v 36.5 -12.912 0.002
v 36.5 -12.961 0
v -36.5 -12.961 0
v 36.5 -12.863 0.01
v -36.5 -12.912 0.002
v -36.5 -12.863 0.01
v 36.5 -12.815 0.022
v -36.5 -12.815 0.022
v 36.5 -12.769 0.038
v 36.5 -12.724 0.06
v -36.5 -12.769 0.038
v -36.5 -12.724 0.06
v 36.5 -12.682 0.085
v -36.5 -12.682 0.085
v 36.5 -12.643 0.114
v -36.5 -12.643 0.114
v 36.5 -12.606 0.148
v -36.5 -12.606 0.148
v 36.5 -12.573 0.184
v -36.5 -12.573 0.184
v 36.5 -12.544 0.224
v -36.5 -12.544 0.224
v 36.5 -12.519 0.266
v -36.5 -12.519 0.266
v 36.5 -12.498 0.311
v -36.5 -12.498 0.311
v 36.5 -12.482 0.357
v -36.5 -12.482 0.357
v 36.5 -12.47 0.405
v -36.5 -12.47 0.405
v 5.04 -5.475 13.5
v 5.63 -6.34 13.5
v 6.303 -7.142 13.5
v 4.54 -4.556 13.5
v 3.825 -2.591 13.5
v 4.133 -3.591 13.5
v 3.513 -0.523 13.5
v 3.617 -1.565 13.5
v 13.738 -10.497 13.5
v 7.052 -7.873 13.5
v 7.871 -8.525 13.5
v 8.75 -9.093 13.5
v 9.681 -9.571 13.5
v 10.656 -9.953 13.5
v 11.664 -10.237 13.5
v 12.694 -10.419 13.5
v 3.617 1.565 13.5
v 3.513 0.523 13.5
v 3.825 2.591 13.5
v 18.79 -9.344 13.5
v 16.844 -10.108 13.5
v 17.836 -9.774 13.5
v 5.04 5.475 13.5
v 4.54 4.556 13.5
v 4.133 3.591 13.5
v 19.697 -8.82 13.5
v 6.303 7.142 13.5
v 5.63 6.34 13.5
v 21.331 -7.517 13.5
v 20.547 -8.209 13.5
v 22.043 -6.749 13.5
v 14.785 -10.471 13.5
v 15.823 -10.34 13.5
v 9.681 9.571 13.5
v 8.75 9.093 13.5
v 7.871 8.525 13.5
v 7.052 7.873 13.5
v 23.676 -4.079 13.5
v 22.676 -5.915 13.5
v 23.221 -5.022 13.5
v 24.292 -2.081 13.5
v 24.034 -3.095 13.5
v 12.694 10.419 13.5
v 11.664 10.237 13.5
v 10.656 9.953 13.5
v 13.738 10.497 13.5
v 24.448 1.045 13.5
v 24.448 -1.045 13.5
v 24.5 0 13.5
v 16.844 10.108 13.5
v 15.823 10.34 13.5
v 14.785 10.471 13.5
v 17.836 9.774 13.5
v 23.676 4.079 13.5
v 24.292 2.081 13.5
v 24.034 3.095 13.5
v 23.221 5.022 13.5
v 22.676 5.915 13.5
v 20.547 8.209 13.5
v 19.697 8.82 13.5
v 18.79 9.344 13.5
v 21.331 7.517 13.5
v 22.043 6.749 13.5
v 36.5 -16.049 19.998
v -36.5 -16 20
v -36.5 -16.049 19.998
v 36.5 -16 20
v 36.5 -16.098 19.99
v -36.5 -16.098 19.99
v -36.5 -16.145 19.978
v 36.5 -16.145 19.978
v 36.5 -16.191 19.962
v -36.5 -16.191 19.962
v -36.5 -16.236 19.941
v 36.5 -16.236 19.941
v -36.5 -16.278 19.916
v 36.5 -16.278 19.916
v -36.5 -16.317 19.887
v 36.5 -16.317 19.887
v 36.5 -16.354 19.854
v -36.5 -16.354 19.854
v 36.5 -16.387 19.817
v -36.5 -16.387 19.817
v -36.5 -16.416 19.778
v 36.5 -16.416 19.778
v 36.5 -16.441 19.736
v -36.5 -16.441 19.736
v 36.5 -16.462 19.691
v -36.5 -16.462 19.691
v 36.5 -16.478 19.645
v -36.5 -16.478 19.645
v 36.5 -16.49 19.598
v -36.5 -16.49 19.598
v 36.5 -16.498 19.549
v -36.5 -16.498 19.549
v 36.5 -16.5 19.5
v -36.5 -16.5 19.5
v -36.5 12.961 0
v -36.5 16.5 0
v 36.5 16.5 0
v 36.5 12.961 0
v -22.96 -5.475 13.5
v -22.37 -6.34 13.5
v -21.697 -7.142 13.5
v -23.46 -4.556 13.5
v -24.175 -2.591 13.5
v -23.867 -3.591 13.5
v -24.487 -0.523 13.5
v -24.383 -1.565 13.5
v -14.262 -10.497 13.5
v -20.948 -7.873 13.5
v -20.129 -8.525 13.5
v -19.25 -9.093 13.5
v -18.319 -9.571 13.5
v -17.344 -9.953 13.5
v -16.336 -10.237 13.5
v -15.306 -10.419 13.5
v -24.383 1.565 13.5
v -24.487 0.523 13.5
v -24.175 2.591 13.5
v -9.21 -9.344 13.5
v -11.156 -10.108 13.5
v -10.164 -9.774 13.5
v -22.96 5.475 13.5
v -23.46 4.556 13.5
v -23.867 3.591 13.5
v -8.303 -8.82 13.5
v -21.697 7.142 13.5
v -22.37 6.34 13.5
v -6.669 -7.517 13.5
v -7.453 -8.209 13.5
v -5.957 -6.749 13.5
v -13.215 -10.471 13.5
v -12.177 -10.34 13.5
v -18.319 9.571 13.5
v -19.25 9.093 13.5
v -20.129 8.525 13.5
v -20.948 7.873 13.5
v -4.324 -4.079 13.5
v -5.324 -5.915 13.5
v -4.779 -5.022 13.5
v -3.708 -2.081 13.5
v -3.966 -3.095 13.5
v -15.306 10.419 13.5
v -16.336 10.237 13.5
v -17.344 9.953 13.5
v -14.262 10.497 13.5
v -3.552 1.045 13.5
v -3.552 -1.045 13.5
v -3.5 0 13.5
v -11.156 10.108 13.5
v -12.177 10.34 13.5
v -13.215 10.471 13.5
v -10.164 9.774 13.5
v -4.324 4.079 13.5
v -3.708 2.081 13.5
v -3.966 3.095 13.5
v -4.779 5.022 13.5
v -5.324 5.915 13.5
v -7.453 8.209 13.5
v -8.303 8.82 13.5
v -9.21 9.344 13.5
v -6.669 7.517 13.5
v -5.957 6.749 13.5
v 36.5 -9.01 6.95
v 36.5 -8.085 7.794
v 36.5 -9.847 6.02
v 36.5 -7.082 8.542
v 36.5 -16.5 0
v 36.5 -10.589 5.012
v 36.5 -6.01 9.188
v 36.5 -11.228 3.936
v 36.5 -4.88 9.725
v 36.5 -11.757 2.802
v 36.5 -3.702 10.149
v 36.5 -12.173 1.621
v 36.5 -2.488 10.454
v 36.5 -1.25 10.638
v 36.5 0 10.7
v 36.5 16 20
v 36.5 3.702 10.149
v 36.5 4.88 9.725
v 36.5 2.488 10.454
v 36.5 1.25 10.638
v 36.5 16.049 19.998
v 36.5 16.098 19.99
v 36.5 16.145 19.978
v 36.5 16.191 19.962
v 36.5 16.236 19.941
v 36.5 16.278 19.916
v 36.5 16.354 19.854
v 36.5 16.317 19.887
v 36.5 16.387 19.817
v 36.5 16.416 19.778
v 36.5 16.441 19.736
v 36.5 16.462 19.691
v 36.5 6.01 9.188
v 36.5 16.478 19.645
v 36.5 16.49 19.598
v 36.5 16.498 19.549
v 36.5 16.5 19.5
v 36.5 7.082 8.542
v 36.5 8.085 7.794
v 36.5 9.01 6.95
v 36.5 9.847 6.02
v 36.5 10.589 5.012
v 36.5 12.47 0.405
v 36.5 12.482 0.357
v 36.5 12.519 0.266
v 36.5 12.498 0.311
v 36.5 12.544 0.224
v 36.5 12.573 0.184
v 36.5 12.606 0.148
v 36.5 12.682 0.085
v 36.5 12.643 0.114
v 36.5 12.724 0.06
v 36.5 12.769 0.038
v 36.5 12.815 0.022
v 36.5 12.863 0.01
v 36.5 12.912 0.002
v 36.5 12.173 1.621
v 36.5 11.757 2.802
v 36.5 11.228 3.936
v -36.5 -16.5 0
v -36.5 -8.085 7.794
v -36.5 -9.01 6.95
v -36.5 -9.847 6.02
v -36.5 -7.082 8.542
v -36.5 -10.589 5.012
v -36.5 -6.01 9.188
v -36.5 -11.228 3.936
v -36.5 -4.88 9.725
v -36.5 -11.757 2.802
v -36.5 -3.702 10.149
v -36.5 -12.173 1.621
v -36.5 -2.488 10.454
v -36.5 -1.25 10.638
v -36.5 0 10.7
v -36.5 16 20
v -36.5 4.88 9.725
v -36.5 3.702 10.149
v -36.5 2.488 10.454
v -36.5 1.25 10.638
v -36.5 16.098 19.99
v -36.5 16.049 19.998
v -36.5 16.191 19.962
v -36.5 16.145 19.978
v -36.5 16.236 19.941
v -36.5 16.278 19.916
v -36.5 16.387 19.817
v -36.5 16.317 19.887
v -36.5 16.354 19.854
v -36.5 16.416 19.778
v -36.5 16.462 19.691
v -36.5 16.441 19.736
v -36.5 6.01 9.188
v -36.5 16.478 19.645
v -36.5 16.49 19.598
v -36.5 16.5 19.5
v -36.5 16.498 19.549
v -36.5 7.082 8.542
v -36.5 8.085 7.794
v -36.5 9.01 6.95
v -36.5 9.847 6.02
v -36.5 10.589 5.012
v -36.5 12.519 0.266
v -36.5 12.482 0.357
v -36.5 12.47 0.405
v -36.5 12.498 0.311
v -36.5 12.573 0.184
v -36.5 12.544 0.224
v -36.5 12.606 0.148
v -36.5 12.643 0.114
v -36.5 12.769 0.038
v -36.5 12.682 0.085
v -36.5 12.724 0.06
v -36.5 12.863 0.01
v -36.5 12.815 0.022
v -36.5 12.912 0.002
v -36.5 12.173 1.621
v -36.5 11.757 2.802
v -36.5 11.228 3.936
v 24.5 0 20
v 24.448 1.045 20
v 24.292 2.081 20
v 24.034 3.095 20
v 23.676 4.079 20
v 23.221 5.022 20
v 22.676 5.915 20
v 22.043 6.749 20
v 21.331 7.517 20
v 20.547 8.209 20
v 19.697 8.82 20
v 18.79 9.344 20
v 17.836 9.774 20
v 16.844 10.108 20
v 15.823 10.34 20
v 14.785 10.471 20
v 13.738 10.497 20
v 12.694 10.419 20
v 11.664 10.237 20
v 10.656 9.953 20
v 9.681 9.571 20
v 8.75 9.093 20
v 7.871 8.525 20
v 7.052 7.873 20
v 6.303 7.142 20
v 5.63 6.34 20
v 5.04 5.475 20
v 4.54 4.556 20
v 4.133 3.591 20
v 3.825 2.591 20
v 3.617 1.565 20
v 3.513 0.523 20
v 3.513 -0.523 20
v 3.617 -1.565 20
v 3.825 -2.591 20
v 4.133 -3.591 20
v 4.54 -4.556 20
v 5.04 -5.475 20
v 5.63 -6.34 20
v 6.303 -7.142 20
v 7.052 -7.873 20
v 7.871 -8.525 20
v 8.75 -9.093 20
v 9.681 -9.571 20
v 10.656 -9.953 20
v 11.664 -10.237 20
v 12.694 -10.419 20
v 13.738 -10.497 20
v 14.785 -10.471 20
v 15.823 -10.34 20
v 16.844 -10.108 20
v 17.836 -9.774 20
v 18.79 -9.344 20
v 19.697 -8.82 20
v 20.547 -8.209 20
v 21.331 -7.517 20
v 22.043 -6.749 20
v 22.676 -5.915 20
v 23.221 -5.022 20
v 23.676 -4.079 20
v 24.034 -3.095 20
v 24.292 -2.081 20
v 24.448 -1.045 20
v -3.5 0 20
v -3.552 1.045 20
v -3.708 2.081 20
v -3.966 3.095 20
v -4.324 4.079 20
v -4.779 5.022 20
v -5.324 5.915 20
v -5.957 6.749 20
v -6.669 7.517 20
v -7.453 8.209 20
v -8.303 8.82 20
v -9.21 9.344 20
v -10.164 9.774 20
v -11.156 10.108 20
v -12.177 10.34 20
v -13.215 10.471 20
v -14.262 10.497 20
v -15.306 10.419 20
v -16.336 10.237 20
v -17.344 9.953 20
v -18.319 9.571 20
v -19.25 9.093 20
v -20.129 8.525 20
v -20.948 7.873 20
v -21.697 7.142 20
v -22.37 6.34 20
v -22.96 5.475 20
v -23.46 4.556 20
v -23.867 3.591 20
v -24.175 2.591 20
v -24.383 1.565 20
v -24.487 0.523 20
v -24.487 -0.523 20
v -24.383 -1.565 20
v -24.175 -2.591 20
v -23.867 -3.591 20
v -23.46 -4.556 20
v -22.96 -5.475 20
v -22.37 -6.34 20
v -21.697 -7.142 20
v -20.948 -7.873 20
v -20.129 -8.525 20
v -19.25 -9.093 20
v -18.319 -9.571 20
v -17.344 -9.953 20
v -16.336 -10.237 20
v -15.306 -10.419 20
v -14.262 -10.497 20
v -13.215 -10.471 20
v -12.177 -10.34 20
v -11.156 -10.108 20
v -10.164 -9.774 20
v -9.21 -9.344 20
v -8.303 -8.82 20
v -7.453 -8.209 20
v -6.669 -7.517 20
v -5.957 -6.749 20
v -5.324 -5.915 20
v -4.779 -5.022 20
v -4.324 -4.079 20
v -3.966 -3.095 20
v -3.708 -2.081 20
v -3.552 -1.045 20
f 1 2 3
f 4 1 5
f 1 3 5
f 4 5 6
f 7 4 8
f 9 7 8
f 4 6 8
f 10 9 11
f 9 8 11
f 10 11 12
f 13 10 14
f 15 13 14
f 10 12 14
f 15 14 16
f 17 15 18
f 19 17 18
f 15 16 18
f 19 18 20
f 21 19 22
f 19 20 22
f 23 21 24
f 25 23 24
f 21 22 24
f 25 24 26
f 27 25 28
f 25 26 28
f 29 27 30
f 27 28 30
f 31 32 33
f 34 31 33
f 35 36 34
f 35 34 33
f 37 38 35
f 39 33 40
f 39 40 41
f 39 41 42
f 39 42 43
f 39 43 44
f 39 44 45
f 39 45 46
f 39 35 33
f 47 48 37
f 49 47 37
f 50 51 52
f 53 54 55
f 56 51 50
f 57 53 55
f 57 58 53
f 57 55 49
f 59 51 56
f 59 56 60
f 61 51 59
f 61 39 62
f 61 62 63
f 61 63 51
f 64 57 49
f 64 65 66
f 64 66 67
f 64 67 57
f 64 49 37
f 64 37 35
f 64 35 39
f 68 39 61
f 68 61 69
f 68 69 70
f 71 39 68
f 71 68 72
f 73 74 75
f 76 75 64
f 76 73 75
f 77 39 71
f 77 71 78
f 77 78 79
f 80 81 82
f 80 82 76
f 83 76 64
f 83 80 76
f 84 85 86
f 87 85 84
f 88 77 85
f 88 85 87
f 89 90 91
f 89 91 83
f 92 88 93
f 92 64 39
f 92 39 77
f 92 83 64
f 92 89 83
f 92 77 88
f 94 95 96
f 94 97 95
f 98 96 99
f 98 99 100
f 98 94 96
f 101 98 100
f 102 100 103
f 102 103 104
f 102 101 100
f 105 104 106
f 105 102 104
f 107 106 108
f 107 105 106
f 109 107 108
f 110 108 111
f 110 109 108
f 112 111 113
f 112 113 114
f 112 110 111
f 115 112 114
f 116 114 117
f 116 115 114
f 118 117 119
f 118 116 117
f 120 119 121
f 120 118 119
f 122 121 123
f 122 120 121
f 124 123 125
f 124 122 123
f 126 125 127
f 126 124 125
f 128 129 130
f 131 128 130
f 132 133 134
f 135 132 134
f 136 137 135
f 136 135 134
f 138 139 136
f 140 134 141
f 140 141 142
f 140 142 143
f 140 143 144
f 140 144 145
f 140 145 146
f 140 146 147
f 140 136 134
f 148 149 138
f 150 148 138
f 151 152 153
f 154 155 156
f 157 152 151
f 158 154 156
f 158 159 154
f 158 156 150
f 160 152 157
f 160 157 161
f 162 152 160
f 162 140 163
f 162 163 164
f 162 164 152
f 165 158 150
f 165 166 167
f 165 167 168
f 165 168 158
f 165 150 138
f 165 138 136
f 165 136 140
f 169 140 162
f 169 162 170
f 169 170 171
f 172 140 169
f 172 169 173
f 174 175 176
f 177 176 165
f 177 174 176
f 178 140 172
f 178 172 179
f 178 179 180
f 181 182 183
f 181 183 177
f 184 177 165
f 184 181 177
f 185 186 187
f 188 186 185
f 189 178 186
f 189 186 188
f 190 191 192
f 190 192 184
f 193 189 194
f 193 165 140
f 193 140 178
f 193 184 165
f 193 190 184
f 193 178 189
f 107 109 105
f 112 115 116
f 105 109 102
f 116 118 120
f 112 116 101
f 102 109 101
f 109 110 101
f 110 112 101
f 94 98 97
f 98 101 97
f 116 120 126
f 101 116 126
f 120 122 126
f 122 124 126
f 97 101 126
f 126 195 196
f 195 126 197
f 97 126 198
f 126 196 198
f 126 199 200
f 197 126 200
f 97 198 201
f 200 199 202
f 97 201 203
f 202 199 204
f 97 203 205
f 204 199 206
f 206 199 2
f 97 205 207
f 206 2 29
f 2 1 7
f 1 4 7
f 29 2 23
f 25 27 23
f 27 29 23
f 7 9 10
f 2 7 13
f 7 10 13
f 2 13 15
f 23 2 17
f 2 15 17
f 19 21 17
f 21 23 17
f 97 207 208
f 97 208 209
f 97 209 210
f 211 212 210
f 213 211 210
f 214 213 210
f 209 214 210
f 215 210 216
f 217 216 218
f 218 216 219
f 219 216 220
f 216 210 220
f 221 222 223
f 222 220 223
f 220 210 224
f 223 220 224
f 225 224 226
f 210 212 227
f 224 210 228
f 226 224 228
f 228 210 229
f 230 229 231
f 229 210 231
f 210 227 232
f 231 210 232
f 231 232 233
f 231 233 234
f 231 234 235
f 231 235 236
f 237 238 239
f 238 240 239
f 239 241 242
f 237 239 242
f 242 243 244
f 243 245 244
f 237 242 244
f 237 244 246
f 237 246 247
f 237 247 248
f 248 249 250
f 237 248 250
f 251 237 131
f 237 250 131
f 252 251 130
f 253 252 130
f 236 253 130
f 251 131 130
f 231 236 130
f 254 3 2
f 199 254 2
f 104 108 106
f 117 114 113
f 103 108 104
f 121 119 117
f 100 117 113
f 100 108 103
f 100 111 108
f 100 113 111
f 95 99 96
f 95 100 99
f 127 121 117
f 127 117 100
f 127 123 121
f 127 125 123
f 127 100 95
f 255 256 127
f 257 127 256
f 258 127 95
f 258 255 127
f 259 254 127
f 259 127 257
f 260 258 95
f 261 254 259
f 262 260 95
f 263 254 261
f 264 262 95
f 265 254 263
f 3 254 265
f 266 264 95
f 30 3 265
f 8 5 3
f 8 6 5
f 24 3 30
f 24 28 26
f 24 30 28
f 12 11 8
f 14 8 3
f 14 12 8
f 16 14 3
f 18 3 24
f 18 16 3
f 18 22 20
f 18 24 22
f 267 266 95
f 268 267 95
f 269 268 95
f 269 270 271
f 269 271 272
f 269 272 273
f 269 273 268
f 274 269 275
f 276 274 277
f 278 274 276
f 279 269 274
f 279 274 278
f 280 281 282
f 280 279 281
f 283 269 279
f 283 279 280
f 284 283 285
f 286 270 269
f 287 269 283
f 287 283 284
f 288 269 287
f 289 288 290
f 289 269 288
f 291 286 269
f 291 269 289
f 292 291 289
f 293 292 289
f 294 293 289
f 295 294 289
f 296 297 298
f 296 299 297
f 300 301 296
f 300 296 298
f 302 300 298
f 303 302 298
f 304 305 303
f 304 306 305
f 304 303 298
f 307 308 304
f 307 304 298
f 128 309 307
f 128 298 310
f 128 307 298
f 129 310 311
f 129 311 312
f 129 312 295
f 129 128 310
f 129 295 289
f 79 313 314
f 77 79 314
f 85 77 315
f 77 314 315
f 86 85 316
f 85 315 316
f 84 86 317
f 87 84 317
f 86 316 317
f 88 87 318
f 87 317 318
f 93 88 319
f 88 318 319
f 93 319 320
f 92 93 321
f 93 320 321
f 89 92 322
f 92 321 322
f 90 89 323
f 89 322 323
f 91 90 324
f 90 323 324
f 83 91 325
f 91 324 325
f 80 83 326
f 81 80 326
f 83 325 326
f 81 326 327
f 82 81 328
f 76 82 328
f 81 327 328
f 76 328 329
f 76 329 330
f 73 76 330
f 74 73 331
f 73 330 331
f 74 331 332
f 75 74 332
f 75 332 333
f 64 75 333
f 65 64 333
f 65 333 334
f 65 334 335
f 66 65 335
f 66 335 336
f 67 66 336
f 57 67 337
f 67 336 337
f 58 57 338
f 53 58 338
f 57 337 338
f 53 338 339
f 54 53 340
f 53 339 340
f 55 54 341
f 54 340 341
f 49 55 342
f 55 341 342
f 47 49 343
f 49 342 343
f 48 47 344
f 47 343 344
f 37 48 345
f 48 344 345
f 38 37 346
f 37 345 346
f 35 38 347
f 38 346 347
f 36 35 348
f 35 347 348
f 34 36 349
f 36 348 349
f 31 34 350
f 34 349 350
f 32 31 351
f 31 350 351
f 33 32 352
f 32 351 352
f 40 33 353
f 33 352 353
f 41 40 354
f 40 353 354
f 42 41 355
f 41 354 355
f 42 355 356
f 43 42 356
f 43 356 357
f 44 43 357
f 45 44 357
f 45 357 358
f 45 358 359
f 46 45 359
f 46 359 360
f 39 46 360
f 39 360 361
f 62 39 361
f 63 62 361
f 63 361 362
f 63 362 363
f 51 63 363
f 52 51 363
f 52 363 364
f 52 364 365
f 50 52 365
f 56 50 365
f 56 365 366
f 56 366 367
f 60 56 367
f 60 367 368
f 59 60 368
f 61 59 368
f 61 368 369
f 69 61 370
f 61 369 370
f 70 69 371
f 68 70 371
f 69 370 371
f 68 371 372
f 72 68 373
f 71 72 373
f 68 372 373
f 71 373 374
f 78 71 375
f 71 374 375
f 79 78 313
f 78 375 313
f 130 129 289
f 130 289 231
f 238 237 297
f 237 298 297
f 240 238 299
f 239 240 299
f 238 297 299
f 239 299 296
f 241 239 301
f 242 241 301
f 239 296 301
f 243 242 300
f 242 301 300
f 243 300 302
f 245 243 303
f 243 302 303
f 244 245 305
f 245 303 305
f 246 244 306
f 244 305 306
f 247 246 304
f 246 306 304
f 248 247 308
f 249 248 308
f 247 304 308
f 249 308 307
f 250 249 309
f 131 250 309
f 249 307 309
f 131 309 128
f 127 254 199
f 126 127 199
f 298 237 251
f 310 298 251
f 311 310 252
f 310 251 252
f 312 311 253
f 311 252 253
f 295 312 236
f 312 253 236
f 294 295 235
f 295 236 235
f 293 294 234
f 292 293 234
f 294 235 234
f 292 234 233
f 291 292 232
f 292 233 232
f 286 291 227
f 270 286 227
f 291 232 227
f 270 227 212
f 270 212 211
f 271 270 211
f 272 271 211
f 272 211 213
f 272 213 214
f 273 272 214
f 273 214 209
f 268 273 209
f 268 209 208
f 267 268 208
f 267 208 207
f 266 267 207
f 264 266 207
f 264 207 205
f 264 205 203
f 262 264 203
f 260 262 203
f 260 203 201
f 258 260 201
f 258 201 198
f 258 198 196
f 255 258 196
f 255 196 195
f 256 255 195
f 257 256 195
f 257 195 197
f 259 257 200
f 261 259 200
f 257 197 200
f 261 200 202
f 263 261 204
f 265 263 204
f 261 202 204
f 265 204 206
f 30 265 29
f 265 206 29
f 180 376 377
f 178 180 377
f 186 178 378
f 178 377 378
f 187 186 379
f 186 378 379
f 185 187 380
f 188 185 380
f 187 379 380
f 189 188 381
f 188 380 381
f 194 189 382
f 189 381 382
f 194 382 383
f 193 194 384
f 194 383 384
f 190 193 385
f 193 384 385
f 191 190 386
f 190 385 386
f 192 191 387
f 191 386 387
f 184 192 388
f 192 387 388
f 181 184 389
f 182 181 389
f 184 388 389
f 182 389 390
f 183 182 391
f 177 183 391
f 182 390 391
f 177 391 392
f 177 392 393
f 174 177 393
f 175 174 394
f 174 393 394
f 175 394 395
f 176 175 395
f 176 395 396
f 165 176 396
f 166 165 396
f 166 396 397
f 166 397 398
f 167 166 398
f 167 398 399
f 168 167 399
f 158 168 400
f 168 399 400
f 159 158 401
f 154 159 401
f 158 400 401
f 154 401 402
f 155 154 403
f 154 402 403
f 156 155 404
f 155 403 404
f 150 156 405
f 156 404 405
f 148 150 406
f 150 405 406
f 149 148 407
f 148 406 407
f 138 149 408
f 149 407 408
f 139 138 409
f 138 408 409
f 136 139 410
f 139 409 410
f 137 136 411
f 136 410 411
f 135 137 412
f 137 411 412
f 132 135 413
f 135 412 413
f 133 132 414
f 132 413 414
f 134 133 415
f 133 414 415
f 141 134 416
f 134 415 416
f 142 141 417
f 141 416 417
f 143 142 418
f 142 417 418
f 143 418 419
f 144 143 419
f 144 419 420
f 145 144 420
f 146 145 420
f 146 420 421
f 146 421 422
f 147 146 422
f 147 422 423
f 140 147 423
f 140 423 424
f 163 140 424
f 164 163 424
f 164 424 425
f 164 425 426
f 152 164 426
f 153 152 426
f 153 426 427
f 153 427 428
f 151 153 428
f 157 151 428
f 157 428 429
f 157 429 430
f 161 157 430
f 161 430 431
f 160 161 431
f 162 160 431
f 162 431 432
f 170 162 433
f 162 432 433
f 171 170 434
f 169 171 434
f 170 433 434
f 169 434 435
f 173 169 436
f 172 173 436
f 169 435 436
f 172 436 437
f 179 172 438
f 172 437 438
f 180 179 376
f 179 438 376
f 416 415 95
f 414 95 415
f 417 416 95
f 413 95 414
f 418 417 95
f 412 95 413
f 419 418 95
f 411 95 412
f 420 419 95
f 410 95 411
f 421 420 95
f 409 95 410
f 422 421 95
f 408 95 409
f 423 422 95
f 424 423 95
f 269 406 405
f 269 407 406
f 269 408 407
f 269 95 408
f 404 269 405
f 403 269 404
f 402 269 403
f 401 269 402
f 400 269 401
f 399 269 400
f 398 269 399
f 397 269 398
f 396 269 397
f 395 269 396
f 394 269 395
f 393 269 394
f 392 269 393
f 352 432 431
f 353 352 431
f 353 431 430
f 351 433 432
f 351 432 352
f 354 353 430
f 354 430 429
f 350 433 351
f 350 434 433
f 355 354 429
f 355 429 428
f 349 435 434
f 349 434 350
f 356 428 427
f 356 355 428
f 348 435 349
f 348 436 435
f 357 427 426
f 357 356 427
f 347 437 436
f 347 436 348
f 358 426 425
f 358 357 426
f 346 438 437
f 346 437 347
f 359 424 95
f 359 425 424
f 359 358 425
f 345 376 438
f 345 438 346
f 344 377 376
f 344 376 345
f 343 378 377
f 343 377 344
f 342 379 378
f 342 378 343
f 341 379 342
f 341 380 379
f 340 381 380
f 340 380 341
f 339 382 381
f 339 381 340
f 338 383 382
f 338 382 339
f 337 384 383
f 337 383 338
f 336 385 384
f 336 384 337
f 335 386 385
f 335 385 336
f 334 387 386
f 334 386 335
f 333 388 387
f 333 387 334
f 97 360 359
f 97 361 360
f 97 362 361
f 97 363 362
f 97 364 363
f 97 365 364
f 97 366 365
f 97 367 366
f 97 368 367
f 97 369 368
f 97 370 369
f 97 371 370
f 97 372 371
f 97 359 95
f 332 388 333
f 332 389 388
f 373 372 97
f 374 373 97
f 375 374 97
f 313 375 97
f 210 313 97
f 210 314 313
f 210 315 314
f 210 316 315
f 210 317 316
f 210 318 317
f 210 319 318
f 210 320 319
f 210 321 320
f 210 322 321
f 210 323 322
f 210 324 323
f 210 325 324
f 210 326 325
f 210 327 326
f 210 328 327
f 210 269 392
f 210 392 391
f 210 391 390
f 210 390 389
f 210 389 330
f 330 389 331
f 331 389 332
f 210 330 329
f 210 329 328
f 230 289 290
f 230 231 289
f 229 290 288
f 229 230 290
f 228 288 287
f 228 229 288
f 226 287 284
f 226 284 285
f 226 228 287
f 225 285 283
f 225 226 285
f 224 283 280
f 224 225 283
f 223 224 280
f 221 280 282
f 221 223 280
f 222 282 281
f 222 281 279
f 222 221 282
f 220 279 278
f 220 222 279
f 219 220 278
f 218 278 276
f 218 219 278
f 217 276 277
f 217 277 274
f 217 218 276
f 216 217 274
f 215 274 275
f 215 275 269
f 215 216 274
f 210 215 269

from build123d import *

# Parameters (mm, degrees)
F0_W     = 73
F0_H     = 33
F1_DEPTH = 20
F2_R     = 10.5
F3_DEPTH = 6.5
F5_DEPTH = 73.001
F6_R     = 0.5


with BuildPart() as f1:
    # F0 (on Top) → F1 (new body)
    with BuildSketch(Plane.XY):
        Rectangle(F0_W, F0_H)
    extrude(amount=F1_DEPTH)

    # F2 (on face) → F3 (cut)
    with BuildSketch(Plane.XY.offset(20)):
        with Locations((-14, 0)):
            Circle(F2_R)
        with Locations((14, 0)):
            Circle(F2_R)
    extrude(amount=-F3_DEPTH, mode=Mode.SUBTRACT)

    # F4 (on face) → F5 (cut, through all)
    with BuildSketch(Plane.YZ.offset(36.5)):
        with BuildLine():
            Line((-12.541531007, 0), (12.541531007, 0))
            ThreePointArc((12.541531007, 0), (0, 10.7), (-12.541531007, 0))
        make_face()
        with BuildLine():
            ThreePointArc((-12.541531007, 0), (-1.0031341413, -14.6603207659), (12.7, -2))
            ThreePointArc((12.7, -2), (12.6603207659, -0.9968658587), (12.541531007, 0))
            Line((12.541531007, 0), (-12.541531007, 0))
        make_face()
    extrude(amount=-F5_DEPTH, mode=Mode.SUBTRACT)

    # F6
    f6_edges = [f1.edges().sort_by_distance(p)[0] for p in [
        (0, 16.5, 20),
        (0, -16.5, 20),
        (0, -12.541531, 0),
        (0, 12.541531, 0),
    ]]
    fillet(f6_edges, radius=F6_R)


solid = f1.part
